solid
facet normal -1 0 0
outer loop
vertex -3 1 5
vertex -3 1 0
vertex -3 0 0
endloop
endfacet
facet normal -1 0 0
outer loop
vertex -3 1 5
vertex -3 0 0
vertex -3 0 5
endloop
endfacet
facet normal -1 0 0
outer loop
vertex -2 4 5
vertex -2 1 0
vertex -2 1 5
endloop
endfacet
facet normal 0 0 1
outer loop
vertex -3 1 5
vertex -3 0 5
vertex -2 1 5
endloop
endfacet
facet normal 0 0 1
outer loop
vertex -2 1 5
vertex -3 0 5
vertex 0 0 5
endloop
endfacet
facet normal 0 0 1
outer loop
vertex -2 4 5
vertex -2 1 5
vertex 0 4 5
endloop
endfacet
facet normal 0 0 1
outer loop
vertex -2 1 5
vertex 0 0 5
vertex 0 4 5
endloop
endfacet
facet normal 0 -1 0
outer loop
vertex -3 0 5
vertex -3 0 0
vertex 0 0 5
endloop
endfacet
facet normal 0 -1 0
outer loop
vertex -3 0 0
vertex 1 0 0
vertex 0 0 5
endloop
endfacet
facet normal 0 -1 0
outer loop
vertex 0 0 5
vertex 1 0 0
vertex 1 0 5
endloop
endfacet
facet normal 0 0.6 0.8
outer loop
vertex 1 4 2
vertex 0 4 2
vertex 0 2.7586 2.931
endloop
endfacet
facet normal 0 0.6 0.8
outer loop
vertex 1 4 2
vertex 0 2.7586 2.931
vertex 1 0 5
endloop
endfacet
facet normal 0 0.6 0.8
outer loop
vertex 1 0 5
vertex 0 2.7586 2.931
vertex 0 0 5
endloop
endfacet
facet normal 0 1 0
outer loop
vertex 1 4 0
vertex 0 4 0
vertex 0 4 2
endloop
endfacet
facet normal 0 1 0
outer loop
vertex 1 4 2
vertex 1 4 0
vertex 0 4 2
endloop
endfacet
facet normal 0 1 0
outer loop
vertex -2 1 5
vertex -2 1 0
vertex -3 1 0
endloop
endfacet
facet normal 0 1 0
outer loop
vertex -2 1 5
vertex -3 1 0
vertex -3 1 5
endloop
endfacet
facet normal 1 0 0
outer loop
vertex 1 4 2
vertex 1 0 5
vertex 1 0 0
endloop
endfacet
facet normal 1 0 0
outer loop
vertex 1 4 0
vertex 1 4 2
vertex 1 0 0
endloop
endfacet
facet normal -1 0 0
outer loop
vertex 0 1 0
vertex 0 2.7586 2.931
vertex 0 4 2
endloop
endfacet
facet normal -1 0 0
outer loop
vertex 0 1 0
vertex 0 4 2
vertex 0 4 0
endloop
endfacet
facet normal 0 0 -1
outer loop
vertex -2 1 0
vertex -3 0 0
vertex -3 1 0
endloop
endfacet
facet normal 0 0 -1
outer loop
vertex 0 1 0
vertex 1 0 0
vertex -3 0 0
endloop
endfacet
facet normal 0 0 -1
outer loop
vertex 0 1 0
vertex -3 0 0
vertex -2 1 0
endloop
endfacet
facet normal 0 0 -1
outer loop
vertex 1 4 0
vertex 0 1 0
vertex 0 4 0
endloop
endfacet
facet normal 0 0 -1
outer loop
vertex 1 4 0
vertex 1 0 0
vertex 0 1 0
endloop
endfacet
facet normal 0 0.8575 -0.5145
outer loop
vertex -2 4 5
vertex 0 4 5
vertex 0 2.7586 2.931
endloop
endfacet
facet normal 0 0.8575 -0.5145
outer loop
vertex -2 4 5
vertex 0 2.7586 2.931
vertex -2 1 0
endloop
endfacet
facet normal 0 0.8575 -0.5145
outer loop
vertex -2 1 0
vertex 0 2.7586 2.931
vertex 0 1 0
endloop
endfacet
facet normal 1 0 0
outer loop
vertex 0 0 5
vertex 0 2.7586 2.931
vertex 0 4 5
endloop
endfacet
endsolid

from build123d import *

# Parameters (mm, degrees)
BOSS_EXTRUDE1_DEPTH = 1
BOSS_EXTRUDE2_DEPTH = 2
SKETCH3_W           = 5
SKETCH3_H           = 1
BOSS_EXTRUDE3_DEPTH = 1


with BuildPart() as part:
    # Sketch1 → Boss-Extrude1 (new body)
    with BuildSketch(Plane(origin=(0, 0, 0), x_dir=(0, 0, -1), z_dir=(1, 0, 0))):
        Polygon((0, 0), (0, 4), (-2, 4), (-5, 0), align=None)
    extrude(amount=BOSS_EXTRUDE1_DEPTH)

    # Sketch2 → Boss-Extrude2 (add)
    with BuildSketch(Plane.ZY):
        Polygon((0, 0), (5, 0), (5, 4), (0, 1), align=None)
    extrude(amount=BOSS_EXTRUDE2_DEPTH)

    # Sketch3 → Boss-Extrude3 (add)
    with BuildSketch(Plane.ZY.offset(2)):
        with Locations((2.5, 0.5)):
            Rectangle(SKETCH3_W, SKETCH3_H)
    extrude(amount=BOSS_EXTRUDE3_DEPTH)


solid = part.part
